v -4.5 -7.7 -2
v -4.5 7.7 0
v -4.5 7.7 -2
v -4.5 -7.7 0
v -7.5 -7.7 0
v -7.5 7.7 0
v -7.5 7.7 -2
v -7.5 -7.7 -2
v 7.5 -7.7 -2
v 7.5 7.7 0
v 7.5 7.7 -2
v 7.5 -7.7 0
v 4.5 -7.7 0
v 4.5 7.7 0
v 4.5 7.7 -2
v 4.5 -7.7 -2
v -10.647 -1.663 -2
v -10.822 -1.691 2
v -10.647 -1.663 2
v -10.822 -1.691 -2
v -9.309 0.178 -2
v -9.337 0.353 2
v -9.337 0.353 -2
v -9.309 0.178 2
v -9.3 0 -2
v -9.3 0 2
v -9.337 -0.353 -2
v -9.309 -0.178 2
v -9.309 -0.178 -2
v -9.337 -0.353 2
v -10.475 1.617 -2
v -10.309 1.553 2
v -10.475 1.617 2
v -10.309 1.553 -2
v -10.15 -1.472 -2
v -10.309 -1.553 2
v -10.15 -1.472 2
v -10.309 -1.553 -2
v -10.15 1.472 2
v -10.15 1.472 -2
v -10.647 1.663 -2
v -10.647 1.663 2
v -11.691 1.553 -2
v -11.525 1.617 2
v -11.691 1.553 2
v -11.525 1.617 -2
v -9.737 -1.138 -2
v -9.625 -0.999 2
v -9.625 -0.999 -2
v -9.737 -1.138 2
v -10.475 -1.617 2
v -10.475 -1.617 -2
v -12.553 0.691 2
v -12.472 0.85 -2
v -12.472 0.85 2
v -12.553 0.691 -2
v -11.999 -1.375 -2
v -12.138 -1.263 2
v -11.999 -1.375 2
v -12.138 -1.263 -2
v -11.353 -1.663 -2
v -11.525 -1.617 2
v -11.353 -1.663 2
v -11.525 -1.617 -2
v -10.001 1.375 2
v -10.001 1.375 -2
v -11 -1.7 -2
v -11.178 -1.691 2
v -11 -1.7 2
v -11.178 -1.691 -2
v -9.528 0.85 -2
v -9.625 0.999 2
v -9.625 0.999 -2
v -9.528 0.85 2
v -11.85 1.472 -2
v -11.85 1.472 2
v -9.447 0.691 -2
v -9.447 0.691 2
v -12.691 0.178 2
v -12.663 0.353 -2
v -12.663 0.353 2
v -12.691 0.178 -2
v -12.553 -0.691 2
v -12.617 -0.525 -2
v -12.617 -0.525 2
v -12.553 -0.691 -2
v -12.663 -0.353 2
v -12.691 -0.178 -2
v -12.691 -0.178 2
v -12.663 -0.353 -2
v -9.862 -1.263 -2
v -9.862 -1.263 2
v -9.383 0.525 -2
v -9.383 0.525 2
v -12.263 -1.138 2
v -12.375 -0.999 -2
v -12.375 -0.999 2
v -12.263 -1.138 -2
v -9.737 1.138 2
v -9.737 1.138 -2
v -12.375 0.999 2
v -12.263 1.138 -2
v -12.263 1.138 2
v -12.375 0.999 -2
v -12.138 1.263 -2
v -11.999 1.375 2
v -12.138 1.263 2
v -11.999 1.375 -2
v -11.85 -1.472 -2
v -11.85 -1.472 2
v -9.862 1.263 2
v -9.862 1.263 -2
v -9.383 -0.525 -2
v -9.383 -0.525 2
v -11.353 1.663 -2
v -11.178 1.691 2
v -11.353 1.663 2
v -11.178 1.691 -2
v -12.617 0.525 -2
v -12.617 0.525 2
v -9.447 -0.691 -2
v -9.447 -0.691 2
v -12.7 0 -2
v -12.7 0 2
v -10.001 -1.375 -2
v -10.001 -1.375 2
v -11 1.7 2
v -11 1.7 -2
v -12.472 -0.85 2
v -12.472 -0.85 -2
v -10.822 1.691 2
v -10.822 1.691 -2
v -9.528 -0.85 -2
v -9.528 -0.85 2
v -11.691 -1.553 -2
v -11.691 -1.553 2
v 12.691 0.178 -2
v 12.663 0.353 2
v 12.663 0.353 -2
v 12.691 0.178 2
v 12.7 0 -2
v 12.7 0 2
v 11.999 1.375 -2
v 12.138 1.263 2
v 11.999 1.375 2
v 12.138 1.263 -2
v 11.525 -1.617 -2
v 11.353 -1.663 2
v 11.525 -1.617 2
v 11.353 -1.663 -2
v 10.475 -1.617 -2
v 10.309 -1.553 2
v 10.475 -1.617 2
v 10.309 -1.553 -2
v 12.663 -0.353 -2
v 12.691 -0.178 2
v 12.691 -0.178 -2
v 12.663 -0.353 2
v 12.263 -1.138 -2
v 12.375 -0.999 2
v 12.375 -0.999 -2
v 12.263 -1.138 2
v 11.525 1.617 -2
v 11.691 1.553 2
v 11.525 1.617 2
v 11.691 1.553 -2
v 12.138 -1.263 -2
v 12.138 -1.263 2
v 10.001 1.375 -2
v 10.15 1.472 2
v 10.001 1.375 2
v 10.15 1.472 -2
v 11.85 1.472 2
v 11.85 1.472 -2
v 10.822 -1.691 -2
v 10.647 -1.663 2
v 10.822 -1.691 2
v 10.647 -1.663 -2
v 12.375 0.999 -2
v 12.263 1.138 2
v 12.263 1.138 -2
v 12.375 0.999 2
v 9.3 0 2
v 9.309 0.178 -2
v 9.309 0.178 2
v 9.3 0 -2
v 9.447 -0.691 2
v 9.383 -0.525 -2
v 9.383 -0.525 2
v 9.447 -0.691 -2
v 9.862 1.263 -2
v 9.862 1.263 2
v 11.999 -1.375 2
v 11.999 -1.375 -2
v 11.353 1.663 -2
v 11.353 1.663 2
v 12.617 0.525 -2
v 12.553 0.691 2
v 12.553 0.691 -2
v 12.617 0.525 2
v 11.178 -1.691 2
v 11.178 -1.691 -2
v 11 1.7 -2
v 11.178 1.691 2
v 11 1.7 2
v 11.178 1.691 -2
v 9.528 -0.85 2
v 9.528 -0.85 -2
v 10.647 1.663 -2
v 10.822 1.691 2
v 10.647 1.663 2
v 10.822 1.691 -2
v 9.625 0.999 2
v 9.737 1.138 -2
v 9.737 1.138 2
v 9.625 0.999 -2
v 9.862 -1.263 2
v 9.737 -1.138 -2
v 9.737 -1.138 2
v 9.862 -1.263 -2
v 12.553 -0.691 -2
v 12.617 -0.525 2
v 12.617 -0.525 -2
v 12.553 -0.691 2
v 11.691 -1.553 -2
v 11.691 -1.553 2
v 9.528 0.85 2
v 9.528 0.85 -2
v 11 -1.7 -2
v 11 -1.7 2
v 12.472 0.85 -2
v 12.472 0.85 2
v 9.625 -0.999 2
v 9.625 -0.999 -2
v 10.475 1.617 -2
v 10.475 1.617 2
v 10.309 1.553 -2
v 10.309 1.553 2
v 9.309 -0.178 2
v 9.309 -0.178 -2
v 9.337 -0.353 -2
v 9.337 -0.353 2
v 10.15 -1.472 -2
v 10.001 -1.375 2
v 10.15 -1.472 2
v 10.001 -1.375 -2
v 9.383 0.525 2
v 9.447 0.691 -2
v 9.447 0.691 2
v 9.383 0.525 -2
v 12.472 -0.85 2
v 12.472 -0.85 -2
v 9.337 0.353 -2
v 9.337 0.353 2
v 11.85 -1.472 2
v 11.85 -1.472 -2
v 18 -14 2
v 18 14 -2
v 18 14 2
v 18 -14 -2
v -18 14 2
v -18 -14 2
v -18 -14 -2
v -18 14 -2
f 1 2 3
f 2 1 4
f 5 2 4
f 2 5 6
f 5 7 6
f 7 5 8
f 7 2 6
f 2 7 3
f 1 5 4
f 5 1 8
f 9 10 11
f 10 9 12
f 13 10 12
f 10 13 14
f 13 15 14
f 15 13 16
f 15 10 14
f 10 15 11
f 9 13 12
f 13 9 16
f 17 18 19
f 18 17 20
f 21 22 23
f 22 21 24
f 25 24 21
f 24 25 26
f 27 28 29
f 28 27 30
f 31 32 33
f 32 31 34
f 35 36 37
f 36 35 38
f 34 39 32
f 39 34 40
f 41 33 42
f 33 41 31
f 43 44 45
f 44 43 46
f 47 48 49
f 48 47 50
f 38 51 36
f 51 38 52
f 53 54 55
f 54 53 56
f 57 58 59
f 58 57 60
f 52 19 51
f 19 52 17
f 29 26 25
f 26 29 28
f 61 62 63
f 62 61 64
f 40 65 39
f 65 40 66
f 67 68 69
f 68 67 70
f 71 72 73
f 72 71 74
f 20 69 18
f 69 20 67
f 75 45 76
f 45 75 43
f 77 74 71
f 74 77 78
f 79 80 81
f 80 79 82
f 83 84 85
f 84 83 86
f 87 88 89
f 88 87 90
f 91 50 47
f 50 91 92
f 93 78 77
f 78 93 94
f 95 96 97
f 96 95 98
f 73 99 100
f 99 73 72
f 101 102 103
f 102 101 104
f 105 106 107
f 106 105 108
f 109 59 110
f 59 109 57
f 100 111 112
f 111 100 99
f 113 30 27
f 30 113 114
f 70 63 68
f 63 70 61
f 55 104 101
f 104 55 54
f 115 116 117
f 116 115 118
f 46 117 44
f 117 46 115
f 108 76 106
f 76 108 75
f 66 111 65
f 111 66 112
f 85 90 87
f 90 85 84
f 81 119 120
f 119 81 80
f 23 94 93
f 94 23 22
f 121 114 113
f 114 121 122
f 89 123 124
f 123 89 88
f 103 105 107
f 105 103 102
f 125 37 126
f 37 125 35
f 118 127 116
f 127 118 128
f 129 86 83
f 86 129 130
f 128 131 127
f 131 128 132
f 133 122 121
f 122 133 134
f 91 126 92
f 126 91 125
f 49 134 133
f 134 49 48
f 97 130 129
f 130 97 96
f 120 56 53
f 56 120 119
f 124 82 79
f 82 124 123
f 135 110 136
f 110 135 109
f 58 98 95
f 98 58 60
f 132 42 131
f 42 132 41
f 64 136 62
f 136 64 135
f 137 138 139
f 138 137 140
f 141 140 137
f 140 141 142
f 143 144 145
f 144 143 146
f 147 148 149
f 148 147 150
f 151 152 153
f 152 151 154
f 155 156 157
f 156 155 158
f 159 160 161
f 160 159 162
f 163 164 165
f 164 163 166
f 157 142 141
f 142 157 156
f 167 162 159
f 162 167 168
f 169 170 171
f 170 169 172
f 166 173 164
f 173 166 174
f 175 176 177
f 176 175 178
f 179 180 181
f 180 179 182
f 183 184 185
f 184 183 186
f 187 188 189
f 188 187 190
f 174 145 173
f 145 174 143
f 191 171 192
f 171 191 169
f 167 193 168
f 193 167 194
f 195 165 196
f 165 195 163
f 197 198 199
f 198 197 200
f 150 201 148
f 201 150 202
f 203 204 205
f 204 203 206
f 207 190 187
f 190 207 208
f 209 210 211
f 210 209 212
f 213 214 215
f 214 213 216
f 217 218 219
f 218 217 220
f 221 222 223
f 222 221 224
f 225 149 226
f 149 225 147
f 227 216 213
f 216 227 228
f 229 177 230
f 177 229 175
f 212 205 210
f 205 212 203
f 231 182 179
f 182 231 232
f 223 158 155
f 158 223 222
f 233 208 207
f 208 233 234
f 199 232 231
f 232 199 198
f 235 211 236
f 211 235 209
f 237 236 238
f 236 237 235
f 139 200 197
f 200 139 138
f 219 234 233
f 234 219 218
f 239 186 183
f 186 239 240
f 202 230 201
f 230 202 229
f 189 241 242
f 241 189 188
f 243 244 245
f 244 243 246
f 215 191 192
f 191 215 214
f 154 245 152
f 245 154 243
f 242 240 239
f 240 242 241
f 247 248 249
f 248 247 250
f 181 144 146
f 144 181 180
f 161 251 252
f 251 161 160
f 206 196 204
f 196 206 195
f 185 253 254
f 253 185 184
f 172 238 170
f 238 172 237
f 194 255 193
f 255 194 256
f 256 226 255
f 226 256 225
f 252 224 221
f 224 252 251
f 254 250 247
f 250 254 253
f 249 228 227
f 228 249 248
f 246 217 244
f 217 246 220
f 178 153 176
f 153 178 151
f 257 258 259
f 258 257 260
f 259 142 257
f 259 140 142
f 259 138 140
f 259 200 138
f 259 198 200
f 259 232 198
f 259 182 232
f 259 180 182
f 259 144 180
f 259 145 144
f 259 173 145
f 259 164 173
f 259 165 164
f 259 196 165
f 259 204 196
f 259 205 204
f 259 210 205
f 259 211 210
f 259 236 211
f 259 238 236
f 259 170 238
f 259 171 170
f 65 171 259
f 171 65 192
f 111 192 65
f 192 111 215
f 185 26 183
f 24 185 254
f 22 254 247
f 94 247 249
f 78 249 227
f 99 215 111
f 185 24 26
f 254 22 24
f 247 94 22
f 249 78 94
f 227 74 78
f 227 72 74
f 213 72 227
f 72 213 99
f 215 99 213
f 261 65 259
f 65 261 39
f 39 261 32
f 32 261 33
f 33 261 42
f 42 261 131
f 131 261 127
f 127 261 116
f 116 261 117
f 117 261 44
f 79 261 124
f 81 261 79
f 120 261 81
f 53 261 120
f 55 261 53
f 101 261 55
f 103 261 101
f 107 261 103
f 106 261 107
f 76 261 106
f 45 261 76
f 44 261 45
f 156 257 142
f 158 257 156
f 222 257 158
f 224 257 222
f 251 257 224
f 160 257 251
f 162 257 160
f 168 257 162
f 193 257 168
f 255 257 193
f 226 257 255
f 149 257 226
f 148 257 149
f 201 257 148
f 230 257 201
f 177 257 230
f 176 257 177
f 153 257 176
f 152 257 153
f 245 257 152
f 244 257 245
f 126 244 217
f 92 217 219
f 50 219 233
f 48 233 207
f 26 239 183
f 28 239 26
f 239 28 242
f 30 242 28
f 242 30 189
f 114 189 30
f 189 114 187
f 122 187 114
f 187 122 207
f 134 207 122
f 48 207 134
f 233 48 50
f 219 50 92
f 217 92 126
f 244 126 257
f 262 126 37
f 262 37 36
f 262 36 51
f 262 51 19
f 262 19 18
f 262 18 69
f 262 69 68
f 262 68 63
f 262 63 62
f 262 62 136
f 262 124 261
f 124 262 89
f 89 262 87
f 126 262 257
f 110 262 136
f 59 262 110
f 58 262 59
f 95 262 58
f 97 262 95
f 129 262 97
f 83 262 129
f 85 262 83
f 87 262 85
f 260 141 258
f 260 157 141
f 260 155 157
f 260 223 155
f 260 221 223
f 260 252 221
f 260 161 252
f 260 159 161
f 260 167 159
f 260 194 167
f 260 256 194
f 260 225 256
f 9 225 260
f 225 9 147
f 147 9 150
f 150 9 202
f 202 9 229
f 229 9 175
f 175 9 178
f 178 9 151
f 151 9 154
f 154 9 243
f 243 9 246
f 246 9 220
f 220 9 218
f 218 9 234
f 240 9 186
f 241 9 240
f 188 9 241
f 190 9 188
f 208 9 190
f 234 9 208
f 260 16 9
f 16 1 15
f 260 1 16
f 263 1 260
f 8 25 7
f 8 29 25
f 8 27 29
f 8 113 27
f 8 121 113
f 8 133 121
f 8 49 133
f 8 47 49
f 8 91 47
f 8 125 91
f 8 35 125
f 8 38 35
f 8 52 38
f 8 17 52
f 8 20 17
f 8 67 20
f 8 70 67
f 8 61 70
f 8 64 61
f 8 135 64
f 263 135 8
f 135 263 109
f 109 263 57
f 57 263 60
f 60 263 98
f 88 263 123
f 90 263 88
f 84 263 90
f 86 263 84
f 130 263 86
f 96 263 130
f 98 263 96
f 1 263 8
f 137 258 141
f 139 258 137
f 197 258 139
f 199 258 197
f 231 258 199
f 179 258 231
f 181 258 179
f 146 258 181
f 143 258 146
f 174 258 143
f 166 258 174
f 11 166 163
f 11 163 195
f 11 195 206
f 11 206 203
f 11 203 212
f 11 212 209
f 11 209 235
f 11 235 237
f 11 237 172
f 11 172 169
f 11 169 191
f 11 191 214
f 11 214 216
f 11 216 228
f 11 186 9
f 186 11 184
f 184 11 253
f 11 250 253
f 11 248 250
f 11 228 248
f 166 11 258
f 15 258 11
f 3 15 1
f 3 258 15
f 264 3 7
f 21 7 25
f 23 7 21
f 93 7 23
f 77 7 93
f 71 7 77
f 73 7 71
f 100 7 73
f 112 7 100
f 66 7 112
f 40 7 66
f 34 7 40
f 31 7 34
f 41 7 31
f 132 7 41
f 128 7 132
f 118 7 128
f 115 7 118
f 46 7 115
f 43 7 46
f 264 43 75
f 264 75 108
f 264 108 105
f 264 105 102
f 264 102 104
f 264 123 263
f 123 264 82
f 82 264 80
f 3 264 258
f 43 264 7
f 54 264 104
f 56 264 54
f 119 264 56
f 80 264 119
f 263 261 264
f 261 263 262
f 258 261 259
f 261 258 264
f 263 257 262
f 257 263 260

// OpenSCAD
// Cable-tie base with two strap slots.
$fn = 60;
eps = 0.02;
base_w = 28;
base_l = 36;
base_t = 4;
slot_w = 3;
slot_l = 12;
difference() {
    cube([base_l,base_w,base_t],center=true);
    for (x=[-slot_l/2,slot_l/2]) translate([x,0,-base_t/2-eps]) cube([slot_w,base_w*0.55,base_t+2*eps],center=true);
    for (x=[-base_l/2+7,base_l/2-7]) translate([x,0,-base_t/2-eps]) cylinder(d=3.4,h=base_t+2*eps);
}
